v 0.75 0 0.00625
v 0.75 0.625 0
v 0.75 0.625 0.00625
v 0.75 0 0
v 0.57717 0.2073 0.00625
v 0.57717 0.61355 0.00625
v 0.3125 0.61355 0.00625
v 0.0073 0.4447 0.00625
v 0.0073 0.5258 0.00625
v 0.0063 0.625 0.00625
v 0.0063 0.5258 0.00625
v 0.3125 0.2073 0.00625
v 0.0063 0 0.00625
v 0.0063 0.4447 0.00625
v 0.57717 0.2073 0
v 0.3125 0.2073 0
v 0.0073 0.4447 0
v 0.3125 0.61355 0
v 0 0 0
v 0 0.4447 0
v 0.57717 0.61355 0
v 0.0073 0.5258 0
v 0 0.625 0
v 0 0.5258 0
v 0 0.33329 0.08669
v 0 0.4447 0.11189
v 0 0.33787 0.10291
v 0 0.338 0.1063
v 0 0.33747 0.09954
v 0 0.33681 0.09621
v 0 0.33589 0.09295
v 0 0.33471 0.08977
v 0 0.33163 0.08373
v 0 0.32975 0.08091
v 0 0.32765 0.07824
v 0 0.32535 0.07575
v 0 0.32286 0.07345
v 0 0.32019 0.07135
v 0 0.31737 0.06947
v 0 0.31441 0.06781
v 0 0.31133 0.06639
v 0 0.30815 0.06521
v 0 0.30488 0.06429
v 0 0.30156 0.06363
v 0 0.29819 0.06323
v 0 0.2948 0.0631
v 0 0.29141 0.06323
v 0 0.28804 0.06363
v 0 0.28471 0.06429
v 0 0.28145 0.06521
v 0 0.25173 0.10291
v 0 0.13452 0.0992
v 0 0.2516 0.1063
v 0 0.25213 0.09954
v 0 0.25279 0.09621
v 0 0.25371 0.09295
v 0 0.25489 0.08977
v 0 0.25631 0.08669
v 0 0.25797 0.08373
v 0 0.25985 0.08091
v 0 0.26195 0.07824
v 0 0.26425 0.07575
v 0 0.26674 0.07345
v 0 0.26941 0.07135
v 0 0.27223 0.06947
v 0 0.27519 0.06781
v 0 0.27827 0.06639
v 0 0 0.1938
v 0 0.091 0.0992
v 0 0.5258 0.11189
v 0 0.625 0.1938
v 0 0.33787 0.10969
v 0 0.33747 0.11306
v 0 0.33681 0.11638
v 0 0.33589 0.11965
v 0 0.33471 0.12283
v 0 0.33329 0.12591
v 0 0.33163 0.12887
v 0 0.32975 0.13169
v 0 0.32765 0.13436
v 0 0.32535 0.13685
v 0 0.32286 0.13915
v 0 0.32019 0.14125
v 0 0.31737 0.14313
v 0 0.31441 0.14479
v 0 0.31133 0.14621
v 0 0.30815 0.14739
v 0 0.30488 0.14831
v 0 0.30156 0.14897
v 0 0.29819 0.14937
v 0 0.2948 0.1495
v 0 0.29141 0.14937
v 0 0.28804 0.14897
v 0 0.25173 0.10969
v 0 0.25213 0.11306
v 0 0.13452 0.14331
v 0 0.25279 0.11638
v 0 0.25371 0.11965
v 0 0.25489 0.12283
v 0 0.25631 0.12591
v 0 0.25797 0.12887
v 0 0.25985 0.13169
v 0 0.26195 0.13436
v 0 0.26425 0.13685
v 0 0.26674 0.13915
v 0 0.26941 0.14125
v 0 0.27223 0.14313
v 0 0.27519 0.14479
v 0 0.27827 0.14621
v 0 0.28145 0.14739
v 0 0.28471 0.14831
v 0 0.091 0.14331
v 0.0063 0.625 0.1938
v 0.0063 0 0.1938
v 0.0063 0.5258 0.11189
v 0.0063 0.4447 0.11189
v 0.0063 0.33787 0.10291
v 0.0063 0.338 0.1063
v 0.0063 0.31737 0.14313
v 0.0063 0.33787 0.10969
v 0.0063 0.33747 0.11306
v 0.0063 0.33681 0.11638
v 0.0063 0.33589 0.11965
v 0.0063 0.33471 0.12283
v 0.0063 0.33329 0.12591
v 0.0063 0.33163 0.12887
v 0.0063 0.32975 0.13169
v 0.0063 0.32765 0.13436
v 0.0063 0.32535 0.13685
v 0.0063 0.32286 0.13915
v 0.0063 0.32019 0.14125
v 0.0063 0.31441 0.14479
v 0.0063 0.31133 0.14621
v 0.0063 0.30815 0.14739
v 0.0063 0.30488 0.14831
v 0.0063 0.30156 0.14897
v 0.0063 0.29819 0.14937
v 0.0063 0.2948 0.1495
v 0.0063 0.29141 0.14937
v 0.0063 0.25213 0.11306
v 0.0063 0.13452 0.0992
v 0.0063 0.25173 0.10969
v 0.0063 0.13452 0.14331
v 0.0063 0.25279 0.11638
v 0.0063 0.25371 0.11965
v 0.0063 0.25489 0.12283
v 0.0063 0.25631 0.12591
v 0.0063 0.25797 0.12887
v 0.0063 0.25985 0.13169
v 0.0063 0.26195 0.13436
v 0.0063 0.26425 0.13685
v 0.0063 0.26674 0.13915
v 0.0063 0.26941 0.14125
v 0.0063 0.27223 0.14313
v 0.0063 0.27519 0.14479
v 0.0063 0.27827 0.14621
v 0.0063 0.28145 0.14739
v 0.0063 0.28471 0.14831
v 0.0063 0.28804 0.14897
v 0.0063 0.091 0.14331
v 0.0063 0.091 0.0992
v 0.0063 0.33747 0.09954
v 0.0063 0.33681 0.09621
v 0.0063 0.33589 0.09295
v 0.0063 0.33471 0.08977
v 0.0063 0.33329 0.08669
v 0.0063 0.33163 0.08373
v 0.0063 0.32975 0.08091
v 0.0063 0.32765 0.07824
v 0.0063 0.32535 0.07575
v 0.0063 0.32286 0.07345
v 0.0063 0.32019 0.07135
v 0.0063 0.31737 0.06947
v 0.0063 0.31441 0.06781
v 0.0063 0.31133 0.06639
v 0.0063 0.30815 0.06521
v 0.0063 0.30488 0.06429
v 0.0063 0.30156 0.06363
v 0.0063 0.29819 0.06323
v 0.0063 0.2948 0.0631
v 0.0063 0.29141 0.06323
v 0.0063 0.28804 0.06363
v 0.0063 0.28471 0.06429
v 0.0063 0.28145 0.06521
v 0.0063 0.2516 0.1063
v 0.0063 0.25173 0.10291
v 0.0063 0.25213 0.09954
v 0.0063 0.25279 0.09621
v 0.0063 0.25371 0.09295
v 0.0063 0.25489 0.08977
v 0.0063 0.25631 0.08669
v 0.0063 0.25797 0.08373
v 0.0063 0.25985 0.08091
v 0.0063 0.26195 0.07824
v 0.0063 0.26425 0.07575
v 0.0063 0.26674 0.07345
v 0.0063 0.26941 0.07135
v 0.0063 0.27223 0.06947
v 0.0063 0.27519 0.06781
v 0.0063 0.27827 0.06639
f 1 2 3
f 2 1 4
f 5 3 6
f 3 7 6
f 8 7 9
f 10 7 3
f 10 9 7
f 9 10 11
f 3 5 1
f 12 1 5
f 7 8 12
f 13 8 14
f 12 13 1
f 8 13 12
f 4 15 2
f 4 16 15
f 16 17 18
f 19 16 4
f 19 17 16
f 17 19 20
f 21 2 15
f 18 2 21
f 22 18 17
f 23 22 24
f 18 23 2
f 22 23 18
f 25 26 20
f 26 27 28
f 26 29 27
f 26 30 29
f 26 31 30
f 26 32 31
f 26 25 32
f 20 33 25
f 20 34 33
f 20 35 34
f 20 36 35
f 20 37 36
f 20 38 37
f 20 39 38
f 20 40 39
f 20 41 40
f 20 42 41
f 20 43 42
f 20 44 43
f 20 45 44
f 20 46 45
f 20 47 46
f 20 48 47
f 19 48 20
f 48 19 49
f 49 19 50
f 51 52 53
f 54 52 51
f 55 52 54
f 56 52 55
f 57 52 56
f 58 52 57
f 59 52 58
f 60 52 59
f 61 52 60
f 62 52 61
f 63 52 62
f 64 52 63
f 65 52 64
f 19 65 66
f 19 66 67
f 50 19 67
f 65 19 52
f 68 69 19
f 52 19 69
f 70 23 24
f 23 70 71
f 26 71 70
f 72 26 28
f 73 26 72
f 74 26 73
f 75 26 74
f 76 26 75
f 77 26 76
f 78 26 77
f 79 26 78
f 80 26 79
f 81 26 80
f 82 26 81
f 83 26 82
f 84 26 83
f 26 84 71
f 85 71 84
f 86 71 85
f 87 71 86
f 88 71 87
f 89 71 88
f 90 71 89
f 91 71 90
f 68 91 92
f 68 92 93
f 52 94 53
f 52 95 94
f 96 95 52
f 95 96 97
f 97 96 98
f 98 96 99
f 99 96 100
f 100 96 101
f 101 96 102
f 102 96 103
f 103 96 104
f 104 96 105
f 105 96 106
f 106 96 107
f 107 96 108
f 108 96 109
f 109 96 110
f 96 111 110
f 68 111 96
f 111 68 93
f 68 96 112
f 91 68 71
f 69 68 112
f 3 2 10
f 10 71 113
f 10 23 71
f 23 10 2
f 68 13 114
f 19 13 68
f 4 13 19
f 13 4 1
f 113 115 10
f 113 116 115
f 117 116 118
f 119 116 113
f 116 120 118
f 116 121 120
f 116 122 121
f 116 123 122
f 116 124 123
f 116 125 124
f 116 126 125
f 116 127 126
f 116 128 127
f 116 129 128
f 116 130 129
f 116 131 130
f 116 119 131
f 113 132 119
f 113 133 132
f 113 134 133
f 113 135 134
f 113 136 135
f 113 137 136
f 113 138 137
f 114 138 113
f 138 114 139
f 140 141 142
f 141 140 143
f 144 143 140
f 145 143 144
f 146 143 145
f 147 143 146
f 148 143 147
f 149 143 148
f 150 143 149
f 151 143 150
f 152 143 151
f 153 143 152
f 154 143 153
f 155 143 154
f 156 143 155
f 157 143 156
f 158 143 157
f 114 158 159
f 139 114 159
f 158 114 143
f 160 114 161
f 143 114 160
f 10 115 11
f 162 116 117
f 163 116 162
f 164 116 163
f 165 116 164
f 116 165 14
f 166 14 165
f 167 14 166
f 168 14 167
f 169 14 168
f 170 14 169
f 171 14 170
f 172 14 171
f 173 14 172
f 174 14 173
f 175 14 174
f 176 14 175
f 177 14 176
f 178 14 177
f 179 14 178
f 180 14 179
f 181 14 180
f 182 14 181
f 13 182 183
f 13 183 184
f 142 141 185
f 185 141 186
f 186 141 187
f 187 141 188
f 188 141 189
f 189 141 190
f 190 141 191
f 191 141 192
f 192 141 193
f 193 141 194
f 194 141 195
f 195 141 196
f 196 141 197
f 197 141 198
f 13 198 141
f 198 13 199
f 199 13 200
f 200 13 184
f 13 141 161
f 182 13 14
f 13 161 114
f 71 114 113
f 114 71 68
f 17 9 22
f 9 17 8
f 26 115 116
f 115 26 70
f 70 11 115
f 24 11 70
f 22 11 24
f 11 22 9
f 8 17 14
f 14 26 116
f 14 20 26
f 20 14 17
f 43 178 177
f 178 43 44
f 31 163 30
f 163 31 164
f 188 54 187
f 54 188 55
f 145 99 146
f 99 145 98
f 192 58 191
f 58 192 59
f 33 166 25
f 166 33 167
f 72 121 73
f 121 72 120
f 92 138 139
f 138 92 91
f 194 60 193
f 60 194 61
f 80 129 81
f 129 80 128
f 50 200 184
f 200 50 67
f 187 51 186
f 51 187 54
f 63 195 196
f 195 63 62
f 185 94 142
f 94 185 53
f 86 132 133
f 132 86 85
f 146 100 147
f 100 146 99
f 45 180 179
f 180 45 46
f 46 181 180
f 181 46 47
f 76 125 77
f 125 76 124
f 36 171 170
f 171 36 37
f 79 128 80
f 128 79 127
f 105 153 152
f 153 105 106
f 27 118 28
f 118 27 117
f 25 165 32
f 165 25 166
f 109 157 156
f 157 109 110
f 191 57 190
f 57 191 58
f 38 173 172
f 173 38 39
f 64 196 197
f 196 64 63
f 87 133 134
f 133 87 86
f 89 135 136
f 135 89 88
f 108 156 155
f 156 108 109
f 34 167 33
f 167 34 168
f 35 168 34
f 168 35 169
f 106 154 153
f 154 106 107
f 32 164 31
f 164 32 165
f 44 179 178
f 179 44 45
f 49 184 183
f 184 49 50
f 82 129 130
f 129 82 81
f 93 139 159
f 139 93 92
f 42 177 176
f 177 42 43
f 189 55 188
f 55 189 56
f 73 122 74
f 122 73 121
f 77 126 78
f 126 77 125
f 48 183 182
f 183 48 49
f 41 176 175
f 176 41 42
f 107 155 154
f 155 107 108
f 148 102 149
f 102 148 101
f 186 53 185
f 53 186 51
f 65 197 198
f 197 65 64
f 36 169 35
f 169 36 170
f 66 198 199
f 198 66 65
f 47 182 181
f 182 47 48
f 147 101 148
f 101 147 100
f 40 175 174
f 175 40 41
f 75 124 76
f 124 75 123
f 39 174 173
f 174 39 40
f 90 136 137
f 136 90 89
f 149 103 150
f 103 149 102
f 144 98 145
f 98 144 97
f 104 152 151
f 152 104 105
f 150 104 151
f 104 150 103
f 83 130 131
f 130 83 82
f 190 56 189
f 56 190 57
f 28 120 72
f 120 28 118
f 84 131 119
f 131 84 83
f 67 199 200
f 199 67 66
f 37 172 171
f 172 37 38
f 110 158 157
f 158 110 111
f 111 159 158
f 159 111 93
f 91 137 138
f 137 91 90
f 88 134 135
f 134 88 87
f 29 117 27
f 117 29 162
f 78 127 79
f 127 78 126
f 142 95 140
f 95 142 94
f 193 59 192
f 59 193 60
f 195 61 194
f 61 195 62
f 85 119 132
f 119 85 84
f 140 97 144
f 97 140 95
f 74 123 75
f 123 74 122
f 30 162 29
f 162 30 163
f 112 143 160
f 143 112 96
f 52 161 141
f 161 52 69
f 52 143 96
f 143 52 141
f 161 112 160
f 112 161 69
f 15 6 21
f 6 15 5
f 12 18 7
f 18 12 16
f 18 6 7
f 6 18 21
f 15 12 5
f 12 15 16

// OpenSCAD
// === Parameters ===

// Base plate
base_length    = 0.75;       // X
base_width     = 0.625;      // Y
base_height    = 0.00625;    // Z

// Left upright wall
wall_thickness   = 0.0063;   // X extent
wall_width       = 0.625;    // Y extent (flush with base)
wall_total_height = 0.1938;  // Z total from base datum

// Lower rectangular opening in wall
lower_rect_y      = 0.4447;       // front offset (from Y=0)
lower_rect_y_size = 0.081103;     // span along wall (Y)
lower_rect_z      = 0.0;          // bottom of opening
lower_rect_z_size = 0.111891;     // height of opening

// Circular through-hole in wall
circ_radius = 0.0432;
circ_y      = 0.2948;                    // center Y (front offset)
circ_z      = (0.0631 + 0.1495) / 2;    // center Z

// Smaller rectangular opening in wall
small_rect_y      = 0.091;        // front offset (from Y=0)
small_rect_y_size = 0.043521;     // span along wall (Y)
small_rect_z      = 0.0992;       // bottom of opening
small_rect_z_size = 0.044108;     // height of opening

// Base plate rectangular through-opening
base_cut_x      = 0.3125;         // left offset
base_cut_x_size = 0.264669;       // X span
base_cut_y      = 0.2073;         // front offset
base_cut_y_size = 0.40625;        // Y span

// Resolution
$fn  = 80;
eps  = 0.001;  // small overlap for clean boolean cuts

// === Model ===
difference() {
    union() {
        // Base plate: sits from Z=0 to Z=base_height
        cube([base_length, base_width, base_height]);

        // Left wall: flush at X=0, spans full width, rises to wall_total_height
        cube([wall_thickness, wall_width, wall_total_height]);
    }

    // 1) Lower rectangular opening through the wall
    translate([-eps, lower_rect_y, lower_rect_z])
        cube([wall_thickness + 2 * eps,
              lower_rect_y_size,
              lower_rect_z_size]);

    // 2) Circular through-hole in the wall
    translate([-eps, circ_y, circ_z])
        rotate([0, 90, 0])
            cylinder(h = wall_thickness + 2 * eps, r = circ_radius);

    // 3) Smaller rectangular through-opening in the wall
    translate([-eps, small_rect_y, small_rect_z])
        cube([wall_thickness + 2 * eps,
              small_rect_y_size,
              small_rect_z_size]);

    // 4) Rectangular through-opening in the base plate
    translate([base_cut_x, base_cut_y, -eps])
        cube([base_cut_x_size,
              base_cut_y_size,
              base_height + 2 * eps]);
}
